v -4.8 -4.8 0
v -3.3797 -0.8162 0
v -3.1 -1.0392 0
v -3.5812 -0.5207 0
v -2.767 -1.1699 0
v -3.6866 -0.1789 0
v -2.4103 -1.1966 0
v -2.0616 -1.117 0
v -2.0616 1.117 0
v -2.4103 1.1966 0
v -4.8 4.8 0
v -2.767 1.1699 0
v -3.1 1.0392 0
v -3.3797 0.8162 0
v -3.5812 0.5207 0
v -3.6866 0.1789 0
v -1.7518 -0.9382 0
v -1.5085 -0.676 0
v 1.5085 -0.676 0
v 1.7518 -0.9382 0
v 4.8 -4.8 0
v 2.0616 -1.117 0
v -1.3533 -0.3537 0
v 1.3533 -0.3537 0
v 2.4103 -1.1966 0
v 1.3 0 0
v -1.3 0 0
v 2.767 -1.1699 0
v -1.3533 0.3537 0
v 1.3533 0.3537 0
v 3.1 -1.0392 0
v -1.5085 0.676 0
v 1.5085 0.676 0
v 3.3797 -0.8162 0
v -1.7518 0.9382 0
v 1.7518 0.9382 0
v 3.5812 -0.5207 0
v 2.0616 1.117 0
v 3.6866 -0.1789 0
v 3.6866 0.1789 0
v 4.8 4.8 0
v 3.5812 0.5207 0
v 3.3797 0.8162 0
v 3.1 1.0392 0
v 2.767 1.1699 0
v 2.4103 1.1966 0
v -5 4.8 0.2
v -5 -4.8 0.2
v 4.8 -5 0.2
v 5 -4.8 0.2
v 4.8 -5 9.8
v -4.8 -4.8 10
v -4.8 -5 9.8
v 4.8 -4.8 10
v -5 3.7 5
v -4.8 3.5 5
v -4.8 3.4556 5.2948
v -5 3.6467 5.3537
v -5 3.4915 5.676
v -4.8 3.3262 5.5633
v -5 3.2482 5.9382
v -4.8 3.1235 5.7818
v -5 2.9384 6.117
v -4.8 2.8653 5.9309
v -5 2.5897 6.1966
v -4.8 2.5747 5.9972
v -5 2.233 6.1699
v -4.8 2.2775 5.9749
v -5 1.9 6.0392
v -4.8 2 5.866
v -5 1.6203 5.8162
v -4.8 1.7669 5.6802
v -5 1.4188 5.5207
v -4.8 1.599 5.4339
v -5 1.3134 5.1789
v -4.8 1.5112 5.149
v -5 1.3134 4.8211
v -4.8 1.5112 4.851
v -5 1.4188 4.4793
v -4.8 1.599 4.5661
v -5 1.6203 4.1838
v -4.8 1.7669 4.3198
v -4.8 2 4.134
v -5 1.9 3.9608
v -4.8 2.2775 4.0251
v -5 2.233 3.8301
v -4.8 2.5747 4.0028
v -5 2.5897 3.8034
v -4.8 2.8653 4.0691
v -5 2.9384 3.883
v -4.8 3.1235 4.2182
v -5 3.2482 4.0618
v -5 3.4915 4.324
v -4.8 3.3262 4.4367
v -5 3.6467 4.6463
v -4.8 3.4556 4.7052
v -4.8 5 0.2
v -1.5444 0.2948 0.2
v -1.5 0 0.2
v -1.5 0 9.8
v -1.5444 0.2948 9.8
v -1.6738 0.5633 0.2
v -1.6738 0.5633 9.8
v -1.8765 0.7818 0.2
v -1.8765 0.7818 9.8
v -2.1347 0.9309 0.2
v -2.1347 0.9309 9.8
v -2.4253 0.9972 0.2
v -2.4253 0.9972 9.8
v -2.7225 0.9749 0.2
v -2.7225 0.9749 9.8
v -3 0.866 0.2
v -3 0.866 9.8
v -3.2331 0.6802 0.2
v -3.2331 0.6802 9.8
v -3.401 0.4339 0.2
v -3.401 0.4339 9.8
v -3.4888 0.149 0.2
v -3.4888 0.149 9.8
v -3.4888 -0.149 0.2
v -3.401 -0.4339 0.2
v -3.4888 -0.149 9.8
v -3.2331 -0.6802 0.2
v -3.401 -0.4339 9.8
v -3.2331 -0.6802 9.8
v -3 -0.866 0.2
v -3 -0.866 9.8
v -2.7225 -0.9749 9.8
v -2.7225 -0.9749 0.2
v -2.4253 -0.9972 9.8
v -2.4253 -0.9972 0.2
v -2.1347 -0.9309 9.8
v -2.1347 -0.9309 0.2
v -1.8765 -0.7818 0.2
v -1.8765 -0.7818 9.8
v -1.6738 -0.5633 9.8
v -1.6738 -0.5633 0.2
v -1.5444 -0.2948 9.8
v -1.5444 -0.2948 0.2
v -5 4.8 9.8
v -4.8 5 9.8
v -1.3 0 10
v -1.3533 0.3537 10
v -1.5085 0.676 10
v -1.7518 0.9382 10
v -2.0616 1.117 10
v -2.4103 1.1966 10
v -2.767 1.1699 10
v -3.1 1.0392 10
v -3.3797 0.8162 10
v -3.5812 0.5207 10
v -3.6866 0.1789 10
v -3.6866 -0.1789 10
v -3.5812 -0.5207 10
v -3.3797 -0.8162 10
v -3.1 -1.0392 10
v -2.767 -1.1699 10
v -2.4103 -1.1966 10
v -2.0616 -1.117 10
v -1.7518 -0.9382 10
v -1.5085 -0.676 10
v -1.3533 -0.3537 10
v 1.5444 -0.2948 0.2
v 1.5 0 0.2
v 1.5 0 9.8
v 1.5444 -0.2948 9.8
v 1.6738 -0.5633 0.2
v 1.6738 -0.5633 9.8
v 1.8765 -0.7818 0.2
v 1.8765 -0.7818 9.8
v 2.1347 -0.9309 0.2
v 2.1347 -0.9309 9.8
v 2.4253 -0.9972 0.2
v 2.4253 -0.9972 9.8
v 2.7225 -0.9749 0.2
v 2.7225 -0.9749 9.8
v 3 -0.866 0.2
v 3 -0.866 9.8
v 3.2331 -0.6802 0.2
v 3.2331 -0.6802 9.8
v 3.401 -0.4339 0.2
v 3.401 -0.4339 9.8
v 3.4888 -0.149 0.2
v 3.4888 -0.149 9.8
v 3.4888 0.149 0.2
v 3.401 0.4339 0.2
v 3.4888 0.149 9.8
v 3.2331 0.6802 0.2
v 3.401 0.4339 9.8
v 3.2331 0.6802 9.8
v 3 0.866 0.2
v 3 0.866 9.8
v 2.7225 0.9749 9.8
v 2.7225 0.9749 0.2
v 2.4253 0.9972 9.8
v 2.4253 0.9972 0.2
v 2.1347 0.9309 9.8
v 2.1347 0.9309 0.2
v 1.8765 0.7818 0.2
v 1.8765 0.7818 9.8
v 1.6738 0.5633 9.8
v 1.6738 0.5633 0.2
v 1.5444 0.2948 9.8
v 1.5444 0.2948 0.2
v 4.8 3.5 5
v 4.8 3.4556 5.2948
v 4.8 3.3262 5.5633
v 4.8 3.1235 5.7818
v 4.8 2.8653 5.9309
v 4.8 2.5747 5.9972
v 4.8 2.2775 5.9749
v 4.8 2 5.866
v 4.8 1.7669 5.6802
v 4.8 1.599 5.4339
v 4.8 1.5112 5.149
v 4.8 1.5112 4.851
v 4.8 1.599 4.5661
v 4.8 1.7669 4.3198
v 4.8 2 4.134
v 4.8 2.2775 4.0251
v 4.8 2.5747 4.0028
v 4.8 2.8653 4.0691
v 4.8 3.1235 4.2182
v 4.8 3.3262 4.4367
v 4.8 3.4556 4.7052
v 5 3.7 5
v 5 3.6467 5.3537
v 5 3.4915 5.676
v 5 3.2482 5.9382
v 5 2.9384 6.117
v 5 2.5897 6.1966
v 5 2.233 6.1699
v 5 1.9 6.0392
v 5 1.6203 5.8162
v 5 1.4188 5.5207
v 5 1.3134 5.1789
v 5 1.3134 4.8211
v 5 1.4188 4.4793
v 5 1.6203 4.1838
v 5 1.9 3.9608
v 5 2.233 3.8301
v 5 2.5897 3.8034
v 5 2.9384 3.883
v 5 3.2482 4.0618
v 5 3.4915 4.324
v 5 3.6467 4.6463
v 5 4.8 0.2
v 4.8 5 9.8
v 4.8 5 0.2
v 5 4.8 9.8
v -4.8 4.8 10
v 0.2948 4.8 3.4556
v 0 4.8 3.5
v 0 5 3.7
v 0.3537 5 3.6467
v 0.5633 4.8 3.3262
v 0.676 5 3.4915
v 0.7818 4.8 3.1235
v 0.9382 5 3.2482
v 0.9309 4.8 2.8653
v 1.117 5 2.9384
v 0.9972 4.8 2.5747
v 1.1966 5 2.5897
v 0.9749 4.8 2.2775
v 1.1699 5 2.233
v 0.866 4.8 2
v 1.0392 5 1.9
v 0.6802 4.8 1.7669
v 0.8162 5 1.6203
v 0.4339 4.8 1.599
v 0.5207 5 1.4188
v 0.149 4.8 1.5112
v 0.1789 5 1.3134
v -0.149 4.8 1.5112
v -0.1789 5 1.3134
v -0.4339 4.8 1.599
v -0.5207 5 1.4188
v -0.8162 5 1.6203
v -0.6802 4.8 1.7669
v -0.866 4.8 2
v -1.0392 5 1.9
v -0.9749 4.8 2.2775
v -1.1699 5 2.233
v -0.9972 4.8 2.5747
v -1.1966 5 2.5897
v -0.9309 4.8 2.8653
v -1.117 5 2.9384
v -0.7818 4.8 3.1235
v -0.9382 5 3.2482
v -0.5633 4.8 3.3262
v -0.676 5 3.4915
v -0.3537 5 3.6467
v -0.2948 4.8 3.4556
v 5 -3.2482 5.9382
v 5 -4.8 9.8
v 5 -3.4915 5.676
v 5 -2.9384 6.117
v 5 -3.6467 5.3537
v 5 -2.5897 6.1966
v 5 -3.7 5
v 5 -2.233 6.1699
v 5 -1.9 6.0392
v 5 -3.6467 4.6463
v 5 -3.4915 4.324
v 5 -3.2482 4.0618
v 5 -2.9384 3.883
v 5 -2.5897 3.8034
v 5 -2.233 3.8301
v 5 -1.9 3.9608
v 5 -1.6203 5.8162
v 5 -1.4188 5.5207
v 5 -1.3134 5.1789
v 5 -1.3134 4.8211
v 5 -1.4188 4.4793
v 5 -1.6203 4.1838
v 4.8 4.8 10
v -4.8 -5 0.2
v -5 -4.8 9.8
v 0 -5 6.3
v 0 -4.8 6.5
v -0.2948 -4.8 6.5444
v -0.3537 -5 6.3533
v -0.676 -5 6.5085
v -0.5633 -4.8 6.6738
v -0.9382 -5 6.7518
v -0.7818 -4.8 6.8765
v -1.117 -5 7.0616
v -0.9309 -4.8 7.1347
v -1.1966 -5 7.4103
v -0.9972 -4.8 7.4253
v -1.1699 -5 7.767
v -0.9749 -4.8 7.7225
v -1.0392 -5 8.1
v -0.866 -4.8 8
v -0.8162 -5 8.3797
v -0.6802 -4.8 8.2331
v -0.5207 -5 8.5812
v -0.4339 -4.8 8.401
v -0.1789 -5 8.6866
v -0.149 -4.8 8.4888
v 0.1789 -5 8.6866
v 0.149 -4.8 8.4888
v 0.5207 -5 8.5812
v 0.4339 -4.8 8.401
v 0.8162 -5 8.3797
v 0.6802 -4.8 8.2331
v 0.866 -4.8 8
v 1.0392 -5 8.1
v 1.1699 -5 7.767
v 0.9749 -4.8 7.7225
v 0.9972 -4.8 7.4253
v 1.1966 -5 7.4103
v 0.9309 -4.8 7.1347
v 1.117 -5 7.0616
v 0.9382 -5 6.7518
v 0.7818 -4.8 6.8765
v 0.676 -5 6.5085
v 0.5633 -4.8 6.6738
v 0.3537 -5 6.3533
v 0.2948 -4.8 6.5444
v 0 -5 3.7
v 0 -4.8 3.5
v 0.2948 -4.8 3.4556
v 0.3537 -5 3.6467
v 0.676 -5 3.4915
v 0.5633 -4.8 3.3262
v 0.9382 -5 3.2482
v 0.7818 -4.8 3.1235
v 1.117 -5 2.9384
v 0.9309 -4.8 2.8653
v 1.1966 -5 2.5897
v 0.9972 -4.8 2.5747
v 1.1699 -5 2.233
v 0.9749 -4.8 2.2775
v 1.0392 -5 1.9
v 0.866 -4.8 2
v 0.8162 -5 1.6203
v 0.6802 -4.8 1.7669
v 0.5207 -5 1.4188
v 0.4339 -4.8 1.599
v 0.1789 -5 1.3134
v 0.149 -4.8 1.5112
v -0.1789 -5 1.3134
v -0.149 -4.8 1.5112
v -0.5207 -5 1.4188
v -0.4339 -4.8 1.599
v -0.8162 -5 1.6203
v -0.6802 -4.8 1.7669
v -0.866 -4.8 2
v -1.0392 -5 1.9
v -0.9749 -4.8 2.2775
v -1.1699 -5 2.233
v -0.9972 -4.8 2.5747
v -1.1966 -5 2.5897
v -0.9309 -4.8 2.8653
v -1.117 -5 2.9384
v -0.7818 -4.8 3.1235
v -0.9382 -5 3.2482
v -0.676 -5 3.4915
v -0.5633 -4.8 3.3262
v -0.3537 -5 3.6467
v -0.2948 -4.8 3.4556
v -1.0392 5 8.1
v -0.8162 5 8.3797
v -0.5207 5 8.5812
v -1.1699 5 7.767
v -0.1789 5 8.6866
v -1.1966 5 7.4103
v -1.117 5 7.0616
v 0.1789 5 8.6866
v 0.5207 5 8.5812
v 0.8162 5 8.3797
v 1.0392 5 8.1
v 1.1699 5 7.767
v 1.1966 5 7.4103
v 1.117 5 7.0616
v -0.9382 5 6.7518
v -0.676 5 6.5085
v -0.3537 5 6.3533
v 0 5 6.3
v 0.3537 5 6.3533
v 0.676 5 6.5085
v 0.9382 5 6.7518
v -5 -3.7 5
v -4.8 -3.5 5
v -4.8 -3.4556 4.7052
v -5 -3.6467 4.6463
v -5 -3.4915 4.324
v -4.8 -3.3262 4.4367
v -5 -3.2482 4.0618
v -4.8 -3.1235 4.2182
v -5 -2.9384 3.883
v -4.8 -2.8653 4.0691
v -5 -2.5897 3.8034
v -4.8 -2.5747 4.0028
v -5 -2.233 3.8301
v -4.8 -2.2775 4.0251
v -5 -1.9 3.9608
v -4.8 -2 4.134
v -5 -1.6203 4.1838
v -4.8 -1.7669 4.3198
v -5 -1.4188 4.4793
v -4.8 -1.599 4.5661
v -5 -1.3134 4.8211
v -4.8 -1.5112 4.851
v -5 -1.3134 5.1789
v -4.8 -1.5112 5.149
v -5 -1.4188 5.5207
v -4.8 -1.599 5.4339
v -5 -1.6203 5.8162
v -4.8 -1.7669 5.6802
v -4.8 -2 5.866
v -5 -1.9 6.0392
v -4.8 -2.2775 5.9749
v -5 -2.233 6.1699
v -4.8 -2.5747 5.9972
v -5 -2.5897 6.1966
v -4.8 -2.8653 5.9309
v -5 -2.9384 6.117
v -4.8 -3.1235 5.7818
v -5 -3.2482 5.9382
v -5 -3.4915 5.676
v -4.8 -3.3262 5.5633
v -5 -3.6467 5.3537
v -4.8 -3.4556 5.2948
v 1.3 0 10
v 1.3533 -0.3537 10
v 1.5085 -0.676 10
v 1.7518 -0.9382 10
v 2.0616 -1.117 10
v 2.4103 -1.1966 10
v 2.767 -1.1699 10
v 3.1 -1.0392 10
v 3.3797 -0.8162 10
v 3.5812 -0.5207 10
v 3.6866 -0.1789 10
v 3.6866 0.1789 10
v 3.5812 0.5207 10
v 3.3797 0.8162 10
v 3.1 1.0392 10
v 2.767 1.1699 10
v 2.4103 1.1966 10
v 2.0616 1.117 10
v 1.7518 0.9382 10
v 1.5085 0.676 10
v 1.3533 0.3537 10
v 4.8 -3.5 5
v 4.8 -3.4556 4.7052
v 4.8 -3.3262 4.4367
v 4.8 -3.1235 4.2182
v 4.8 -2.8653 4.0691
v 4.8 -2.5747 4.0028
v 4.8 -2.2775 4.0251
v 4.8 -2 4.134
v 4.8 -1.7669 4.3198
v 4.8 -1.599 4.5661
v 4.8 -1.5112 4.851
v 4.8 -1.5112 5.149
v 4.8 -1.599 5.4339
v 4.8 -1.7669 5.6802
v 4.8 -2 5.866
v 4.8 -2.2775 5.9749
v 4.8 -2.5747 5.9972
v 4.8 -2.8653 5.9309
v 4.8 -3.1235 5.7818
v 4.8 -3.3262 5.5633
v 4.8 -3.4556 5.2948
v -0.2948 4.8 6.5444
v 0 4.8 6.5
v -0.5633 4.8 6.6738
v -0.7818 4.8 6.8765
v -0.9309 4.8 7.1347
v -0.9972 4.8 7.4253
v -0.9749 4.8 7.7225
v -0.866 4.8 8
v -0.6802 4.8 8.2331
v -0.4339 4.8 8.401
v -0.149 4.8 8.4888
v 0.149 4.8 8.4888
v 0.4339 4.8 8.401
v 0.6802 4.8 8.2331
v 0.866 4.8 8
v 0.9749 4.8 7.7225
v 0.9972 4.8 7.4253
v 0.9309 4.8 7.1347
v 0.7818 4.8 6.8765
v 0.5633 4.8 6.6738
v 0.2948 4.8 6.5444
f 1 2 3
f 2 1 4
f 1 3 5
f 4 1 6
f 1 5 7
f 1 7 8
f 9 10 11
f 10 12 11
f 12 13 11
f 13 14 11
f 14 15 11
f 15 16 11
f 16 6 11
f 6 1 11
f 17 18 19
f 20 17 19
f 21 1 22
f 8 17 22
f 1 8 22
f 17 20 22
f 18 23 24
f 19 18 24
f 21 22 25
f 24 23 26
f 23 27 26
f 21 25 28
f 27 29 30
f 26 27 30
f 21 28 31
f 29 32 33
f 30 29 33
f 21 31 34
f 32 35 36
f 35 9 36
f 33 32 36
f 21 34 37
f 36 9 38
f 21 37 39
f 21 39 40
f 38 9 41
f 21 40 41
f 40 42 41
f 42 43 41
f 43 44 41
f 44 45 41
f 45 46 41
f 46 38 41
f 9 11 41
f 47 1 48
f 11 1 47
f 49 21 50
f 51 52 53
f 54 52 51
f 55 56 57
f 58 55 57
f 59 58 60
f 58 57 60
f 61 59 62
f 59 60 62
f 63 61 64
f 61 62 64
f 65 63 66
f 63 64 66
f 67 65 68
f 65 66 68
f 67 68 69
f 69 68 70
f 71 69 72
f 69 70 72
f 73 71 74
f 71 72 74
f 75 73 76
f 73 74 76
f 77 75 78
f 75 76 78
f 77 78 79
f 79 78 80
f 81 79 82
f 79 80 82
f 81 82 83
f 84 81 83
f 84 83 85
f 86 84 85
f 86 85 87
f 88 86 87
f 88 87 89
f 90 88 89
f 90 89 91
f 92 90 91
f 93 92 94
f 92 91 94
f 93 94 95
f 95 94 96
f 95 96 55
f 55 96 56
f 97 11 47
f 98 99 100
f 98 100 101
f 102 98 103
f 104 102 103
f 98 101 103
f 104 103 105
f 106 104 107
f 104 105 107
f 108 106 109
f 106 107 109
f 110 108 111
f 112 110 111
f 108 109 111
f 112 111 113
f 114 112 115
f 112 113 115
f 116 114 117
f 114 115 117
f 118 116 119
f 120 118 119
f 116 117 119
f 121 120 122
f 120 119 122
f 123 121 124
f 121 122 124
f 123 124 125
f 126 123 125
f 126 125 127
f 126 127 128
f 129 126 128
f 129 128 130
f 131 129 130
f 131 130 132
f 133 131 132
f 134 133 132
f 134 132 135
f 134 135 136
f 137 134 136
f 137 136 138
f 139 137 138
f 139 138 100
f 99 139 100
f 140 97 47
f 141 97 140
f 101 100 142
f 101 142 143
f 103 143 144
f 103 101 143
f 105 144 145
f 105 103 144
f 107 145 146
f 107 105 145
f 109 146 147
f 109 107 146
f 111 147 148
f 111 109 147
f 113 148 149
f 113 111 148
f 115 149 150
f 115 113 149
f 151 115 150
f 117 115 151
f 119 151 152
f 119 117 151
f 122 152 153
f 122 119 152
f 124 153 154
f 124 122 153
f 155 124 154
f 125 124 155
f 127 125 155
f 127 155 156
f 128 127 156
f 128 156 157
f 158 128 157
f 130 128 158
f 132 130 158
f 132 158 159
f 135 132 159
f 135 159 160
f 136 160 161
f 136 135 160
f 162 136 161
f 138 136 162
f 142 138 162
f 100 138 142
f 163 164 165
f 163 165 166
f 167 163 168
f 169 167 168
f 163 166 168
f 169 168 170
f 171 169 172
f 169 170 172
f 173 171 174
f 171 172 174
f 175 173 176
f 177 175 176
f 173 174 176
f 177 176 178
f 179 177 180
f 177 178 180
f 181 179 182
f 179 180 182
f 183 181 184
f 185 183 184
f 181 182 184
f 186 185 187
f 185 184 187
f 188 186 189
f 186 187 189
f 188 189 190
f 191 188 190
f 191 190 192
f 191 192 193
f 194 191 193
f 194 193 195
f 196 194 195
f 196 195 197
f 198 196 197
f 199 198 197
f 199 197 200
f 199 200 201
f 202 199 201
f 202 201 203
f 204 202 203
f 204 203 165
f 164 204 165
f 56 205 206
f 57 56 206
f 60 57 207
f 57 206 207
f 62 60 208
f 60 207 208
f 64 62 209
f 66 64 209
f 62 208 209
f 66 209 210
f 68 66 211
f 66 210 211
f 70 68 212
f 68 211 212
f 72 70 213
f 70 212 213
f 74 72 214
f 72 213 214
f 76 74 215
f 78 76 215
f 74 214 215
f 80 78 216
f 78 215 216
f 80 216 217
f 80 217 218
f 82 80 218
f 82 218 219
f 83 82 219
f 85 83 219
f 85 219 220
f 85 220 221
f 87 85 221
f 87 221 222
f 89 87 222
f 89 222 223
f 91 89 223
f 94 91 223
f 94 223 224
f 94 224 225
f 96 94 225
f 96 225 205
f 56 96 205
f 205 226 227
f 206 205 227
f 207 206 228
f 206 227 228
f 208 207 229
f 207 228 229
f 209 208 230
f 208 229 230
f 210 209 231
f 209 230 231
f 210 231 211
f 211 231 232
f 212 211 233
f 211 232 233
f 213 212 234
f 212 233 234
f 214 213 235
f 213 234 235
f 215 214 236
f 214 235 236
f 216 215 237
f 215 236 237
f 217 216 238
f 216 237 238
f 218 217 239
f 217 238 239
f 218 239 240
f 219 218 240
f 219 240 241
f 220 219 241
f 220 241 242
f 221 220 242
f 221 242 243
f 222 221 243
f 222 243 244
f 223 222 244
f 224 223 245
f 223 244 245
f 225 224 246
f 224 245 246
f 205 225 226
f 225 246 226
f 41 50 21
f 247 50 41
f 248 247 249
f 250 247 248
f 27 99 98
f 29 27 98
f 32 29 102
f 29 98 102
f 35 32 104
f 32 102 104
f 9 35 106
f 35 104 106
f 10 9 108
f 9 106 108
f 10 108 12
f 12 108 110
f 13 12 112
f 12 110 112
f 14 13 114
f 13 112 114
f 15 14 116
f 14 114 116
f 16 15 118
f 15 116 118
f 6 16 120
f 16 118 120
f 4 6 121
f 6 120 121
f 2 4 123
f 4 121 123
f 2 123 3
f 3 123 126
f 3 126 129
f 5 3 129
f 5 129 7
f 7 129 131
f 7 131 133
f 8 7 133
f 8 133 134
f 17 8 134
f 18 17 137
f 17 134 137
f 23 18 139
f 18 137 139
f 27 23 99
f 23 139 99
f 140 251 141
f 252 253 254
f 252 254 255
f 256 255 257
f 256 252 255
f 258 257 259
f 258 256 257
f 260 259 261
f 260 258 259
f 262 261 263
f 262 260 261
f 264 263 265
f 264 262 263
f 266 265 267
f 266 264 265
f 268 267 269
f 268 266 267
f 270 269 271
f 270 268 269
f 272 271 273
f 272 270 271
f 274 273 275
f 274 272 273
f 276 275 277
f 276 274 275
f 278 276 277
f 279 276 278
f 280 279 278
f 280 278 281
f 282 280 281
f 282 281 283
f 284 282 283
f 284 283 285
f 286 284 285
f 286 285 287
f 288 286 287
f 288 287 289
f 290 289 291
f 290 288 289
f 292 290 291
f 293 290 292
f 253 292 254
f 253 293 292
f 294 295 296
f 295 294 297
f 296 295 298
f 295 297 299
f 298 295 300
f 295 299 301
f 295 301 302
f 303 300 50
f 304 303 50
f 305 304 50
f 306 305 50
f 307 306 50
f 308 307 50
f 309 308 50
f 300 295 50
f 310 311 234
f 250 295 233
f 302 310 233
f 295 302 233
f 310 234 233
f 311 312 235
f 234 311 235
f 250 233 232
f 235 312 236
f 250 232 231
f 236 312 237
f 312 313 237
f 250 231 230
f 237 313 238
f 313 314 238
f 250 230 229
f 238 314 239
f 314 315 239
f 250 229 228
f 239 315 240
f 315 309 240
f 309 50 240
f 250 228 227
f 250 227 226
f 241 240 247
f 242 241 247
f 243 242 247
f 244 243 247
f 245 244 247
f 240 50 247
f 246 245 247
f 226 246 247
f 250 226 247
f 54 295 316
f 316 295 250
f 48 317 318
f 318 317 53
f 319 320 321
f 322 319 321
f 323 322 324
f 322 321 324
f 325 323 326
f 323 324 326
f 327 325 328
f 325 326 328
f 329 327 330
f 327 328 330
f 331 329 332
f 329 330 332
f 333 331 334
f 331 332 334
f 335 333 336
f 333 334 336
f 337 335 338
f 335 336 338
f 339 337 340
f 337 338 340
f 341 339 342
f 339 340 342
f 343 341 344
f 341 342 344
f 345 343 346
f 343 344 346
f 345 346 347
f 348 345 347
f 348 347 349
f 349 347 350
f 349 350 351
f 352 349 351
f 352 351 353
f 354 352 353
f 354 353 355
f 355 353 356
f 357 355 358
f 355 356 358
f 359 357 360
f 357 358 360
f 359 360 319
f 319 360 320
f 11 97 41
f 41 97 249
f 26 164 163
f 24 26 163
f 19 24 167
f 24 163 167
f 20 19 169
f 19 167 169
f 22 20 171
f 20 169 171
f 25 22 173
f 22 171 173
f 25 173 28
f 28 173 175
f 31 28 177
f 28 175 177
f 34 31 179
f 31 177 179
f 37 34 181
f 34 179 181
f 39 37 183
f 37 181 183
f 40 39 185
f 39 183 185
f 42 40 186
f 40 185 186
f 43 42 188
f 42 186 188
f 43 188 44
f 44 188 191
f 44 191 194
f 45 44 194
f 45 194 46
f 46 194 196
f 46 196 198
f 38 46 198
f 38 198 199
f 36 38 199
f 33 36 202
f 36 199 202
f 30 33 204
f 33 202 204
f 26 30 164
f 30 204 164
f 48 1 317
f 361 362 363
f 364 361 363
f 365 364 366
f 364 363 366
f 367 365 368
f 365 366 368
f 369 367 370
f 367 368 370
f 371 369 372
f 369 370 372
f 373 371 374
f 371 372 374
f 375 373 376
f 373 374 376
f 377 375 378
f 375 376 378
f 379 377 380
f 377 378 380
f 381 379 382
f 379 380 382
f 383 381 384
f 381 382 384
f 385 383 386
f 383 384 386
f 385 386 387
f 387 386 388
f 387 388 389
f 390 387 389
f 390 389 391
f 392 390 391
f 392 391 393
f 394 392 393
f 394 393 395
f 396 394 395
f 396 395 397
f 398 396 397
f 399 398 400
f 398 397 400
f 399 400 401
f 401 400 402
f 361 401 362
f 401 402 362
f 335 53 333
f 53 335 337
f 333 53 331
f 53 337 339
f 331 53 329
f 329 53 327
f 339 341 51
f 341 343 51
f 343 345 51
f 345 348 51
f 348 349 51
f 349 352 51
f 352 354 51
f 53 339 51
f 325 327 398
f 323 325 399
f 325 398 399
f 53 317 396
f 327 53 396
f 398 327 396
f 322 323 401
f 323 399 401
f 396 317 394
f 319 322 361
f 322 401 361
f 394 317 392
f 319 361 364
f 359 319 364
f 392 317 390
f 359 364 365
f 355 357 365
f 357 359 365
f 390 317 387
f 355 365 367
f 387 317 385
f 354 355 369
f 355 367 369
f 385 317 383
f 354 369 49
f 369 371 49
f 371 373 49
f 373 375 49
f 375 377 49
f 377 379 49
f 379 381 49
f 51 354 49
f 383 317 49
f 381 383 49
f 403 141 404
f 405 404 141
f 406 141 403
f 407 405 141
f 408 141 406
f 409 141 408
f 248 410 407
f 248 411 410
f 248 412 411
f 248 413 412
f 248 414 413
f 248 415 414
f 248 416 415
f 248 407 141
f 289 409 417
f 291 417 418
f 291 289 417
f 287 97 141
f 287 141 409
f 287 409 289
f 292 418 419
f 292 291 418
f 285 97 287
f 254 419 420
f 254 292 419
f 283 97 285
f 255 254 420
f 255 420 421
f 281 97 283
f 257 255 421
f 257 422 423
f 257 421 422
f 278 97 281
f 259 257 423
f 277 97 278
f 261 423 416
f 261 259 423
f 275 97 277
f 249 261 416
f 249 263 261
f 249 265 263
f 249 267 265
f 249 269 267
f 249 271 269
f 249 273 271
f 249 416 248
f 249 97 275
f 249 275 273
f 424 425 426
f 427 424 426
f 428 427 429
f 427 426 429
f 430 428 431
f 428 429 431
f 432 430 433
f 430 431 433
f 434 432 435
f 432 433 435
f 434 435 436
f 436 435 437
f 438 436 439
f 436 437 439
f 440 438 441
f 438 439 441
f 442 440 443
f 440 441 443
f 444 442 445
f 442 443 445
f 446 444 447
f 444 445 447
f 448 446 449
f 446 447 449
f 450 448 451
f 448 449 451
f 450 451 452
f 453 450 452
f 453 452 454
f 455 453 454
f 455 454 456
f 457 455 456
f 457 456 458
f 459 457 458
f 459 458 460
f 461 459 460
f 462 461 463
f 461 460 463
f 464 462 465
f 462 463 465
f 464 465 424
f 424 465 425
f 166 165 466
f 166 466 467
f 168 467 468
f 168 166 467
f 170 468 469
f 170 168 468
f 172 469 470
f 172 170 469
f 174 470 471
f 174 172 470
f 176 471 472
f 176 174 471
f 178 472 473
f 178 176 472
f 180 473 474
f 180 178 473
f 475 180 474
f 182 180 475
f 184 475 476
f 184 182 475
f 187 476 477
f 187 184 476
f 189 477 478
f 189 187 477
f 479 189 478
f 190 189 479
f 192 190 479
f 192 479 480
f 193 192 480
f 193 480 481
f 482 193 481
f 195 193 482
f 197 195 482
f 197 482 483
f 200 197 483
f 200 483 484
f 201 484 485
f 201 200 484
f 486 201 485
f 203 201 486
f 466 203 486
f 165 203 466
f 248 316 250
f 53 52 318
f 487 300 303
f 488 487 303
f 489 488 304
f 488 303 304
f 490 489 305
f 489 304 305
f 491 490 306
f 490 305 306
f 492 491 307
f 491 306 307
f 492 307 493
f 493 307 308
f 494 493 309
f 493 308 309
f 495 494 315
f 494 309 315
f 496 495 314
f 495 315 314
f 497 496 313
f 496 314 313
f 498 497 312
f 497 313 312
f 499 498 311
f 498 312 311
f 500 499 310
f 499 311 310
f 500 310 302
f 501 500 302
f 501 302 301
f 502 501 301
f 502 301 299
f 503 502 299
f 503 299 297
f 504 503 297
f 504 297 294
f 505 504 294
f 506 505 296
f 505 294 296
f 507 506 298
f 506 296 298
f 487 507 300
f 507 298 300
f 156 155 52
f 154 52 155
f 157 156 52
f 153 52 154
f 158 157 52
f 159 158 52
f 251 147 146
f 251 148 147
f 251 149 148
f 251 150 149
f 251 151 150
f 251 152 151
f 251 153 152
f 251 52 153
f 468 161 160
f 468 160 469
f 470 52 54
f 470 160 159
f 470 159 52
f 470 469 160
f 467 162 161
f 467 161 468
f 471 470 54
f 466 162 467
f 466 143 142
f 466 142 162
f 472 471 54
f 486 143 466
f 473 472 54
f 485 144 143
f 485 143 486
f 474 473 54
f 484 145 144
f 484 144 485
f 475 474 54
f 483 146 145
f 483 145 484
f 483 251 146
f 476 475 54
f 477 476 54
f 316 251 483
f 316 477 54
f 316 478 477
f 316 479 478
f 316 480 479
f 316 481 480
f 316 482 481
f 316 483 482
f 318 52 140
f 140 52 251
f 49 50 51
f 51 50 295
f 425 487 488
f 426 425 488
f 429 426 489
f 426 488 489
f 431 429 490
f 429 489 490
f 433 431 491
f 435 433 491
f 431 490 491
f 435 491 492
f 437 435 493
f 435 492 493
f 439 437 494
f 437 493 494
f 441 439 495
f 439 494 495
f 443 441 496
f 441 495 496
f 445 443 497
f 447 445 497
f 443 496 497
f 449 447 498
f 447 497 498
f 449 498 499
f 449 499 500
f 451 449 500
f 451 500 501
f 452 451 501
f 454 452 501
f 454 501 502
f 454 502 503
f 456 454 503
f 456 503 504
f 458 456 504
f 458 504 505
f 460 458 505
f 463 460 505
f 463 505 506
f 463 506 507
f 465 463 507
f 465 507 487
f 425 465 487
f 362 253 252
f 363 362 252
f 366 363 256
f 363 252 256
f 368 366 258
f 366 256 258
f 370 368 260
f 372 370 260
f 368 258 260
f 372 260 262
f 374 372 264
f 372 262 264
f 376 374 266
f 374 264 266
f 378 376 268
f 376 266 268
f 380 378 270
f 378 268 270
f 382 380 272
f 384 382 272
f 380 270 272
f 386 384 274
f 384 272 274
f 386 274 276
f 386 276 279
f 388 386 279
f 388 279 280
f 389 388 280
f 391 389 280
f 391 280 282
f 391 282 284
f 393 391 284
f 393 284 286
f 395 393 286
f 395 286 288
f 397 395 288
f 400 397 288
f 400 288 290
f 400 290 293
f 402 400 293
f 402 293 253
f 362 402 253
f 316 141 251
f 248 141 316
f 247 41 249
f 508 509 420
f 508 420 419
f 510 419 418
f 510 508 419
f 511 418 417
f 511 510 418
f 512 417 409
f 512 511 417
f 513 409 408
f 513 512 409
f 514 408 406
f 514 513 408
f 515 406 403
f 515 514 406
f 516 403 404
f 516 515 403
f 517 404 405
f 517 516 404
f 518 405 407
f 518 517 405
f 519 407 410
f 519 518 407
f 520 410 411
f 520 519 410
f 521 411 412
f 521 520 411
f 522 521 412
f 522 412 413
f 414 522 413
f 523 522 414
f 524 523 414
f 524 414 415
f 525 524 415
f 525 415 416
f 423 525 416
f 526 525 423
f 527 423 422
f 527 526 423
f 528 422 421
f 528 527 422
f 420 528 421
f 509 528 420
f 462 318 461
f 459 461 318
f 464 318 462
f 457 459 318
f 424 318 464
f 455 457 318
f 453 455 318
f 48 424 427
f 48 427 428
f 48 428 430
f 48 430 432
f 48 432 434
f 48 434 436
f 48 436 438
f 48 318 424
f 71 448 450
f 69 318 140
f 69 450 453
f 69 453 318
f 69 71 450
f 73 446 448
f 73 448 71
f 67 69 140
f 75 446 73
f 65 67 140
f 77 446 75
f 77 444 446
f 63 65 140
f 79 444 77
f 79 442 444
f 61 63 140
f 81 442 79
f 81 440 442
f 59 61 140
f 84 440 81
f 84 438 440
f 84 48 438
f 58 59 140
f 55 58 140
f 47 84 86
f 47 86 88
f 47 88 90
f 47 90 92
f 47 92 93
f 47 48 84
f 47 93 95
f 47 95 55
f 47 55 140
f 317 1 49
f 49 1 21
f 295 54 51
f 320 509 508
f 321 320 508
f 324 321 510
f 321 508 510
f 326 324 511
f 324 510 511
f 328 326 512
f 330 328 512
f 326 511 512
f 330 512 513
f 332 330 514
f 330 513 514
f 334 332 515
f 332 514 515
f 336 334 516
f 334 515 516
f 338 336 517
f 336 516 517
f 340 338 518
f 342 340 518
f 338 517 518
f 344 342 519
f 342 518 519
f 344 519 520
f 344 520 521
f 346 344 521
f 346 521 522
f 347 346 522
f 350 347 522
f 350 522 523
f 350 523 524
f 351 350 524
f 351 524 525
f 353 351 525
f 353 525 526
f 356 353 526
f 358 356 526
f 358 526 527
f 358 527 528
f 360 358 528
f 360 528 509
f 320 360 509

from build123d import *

# Parameters (mm, degrees)
SKETCH1_W           = 10
SKETCH1_H           = 10
BOSS_EXTRUDE1_DEPTH = 10
SKETCH2_R           = 1
CUT_EXTRUDE1_DEPTH  = 11
SKETCH3_R           = 1
CUT_EXTRUDE2_DEPTH  = 11
SKETCH5_R           = 1
CUT_EXTRUDE4_DEPTH  = 11
CHAMFER1_SIZE       = 0.2
CHAMFER2_SIZE       = 0.2


with BuildPart() as part:
    # Sketch1 → Boss-Extrude1 (new body)
    with BuildSketch(Plane.XY):
        Rectangle(SKETCH1_W, SKETCH1_H)
    extrude(amount=BOSS_EXTRUDE1_DEPTH)

    # Sketch2 → Cut-Extrude1 (cut, through all)
    with BuildSketch(Plane.XY.offset(10)):
        with Locations((-2.5, 0)):
            Circle(SKETCH2_R)
        with Locations(Location((2.5, 0, 0), (0, 0, 180))):  # turned: the seam where the file's is
            Circle(SKETCH2_R)
    extrude(amount=-CUT_EXTRUDE1_DEPTH, mode=Mode.SUBTRACT)

    # Sketch3 → Cut-Extrude2 (cut, through all)
    with BuildSketch(Plane(origin=(0, 5, 0), x_dir=(1, 0, 0), z_dir=(0, 1, 0))):
        with Locations(Location((0, -7.5, 0), (0, 0, 90))):  # turned: the seam where the file's is
            Circle(SKETCH3_R)
        with Locations(Location((0, -2.5, 0), (0, 0, 270))):  # turned: the seam where the file's is
            Circle(SKETCH3_R)
    extrude(amount=-CUT_EXTRUDE2_DEPTH, mode=Mode.SUBTRACT)

    # Sketch5 → Cut-Extrude4 (cut, through all)
    with BuildSketch(Plane(origin=(5, 0, 0), x_dir=(0, 0, -1), z_dir=(1, 0, 0))):
        with Locations(Location((-5, 2.5, 0), (0, 0, 90))):  # turned: the seam where the file's is
            Circle(SKETCH5_R)
        with Locations(Location((-5, -2.5, 0), (0, 0, 270))):  # turned: the seam where the file's is
            Circle(SKETCH5_R)
    extrude(amount=-CUT_EXTRUDE4_DEPTH, mode=Mode.SUBTRACT)

    # Chamfer1
    chamfer1_edges = [part.edges().sort_by_distance(p)[0] for p in [
        (5, 0, 10),
        (0, 5, 10),
        (-5, 0, 10),
        (0, 5, 0),
        (5, 0, 0),
        (0, -5, 0),
        (-5, 0, 0),
        (0, -5, 10),
        (-5, 5, 5),
        (5, 5, 5),
        (5, -5, 5),
        (-5, -5, 5),
    ]]
    chamfer(chamfer1_edges, length=CHAMFER1_SIZE)

    # Chamfer2
    chamfer2_edges = [part.edges().sort_by_distance(p)[0] for p in [
        (-3.5, 0, 0),
        (-3.5, 0, 10),
        (3.5, 0, 0),
        (3.5, 0, 10),
        (0, -5, 8.5),
        (0, 5, 8.5),
        (0, -5, 1.5),
        (0, 5, 1.5),
        (-5, 1.5, 5),
        (5, 1.5, 5),
        (-5, -1.5, 5),
        (5, -1.5, 5),
    ]]
    chamfer(chamfer2_edges, length=CHAMFER2_SIZE)


solid = part.part
